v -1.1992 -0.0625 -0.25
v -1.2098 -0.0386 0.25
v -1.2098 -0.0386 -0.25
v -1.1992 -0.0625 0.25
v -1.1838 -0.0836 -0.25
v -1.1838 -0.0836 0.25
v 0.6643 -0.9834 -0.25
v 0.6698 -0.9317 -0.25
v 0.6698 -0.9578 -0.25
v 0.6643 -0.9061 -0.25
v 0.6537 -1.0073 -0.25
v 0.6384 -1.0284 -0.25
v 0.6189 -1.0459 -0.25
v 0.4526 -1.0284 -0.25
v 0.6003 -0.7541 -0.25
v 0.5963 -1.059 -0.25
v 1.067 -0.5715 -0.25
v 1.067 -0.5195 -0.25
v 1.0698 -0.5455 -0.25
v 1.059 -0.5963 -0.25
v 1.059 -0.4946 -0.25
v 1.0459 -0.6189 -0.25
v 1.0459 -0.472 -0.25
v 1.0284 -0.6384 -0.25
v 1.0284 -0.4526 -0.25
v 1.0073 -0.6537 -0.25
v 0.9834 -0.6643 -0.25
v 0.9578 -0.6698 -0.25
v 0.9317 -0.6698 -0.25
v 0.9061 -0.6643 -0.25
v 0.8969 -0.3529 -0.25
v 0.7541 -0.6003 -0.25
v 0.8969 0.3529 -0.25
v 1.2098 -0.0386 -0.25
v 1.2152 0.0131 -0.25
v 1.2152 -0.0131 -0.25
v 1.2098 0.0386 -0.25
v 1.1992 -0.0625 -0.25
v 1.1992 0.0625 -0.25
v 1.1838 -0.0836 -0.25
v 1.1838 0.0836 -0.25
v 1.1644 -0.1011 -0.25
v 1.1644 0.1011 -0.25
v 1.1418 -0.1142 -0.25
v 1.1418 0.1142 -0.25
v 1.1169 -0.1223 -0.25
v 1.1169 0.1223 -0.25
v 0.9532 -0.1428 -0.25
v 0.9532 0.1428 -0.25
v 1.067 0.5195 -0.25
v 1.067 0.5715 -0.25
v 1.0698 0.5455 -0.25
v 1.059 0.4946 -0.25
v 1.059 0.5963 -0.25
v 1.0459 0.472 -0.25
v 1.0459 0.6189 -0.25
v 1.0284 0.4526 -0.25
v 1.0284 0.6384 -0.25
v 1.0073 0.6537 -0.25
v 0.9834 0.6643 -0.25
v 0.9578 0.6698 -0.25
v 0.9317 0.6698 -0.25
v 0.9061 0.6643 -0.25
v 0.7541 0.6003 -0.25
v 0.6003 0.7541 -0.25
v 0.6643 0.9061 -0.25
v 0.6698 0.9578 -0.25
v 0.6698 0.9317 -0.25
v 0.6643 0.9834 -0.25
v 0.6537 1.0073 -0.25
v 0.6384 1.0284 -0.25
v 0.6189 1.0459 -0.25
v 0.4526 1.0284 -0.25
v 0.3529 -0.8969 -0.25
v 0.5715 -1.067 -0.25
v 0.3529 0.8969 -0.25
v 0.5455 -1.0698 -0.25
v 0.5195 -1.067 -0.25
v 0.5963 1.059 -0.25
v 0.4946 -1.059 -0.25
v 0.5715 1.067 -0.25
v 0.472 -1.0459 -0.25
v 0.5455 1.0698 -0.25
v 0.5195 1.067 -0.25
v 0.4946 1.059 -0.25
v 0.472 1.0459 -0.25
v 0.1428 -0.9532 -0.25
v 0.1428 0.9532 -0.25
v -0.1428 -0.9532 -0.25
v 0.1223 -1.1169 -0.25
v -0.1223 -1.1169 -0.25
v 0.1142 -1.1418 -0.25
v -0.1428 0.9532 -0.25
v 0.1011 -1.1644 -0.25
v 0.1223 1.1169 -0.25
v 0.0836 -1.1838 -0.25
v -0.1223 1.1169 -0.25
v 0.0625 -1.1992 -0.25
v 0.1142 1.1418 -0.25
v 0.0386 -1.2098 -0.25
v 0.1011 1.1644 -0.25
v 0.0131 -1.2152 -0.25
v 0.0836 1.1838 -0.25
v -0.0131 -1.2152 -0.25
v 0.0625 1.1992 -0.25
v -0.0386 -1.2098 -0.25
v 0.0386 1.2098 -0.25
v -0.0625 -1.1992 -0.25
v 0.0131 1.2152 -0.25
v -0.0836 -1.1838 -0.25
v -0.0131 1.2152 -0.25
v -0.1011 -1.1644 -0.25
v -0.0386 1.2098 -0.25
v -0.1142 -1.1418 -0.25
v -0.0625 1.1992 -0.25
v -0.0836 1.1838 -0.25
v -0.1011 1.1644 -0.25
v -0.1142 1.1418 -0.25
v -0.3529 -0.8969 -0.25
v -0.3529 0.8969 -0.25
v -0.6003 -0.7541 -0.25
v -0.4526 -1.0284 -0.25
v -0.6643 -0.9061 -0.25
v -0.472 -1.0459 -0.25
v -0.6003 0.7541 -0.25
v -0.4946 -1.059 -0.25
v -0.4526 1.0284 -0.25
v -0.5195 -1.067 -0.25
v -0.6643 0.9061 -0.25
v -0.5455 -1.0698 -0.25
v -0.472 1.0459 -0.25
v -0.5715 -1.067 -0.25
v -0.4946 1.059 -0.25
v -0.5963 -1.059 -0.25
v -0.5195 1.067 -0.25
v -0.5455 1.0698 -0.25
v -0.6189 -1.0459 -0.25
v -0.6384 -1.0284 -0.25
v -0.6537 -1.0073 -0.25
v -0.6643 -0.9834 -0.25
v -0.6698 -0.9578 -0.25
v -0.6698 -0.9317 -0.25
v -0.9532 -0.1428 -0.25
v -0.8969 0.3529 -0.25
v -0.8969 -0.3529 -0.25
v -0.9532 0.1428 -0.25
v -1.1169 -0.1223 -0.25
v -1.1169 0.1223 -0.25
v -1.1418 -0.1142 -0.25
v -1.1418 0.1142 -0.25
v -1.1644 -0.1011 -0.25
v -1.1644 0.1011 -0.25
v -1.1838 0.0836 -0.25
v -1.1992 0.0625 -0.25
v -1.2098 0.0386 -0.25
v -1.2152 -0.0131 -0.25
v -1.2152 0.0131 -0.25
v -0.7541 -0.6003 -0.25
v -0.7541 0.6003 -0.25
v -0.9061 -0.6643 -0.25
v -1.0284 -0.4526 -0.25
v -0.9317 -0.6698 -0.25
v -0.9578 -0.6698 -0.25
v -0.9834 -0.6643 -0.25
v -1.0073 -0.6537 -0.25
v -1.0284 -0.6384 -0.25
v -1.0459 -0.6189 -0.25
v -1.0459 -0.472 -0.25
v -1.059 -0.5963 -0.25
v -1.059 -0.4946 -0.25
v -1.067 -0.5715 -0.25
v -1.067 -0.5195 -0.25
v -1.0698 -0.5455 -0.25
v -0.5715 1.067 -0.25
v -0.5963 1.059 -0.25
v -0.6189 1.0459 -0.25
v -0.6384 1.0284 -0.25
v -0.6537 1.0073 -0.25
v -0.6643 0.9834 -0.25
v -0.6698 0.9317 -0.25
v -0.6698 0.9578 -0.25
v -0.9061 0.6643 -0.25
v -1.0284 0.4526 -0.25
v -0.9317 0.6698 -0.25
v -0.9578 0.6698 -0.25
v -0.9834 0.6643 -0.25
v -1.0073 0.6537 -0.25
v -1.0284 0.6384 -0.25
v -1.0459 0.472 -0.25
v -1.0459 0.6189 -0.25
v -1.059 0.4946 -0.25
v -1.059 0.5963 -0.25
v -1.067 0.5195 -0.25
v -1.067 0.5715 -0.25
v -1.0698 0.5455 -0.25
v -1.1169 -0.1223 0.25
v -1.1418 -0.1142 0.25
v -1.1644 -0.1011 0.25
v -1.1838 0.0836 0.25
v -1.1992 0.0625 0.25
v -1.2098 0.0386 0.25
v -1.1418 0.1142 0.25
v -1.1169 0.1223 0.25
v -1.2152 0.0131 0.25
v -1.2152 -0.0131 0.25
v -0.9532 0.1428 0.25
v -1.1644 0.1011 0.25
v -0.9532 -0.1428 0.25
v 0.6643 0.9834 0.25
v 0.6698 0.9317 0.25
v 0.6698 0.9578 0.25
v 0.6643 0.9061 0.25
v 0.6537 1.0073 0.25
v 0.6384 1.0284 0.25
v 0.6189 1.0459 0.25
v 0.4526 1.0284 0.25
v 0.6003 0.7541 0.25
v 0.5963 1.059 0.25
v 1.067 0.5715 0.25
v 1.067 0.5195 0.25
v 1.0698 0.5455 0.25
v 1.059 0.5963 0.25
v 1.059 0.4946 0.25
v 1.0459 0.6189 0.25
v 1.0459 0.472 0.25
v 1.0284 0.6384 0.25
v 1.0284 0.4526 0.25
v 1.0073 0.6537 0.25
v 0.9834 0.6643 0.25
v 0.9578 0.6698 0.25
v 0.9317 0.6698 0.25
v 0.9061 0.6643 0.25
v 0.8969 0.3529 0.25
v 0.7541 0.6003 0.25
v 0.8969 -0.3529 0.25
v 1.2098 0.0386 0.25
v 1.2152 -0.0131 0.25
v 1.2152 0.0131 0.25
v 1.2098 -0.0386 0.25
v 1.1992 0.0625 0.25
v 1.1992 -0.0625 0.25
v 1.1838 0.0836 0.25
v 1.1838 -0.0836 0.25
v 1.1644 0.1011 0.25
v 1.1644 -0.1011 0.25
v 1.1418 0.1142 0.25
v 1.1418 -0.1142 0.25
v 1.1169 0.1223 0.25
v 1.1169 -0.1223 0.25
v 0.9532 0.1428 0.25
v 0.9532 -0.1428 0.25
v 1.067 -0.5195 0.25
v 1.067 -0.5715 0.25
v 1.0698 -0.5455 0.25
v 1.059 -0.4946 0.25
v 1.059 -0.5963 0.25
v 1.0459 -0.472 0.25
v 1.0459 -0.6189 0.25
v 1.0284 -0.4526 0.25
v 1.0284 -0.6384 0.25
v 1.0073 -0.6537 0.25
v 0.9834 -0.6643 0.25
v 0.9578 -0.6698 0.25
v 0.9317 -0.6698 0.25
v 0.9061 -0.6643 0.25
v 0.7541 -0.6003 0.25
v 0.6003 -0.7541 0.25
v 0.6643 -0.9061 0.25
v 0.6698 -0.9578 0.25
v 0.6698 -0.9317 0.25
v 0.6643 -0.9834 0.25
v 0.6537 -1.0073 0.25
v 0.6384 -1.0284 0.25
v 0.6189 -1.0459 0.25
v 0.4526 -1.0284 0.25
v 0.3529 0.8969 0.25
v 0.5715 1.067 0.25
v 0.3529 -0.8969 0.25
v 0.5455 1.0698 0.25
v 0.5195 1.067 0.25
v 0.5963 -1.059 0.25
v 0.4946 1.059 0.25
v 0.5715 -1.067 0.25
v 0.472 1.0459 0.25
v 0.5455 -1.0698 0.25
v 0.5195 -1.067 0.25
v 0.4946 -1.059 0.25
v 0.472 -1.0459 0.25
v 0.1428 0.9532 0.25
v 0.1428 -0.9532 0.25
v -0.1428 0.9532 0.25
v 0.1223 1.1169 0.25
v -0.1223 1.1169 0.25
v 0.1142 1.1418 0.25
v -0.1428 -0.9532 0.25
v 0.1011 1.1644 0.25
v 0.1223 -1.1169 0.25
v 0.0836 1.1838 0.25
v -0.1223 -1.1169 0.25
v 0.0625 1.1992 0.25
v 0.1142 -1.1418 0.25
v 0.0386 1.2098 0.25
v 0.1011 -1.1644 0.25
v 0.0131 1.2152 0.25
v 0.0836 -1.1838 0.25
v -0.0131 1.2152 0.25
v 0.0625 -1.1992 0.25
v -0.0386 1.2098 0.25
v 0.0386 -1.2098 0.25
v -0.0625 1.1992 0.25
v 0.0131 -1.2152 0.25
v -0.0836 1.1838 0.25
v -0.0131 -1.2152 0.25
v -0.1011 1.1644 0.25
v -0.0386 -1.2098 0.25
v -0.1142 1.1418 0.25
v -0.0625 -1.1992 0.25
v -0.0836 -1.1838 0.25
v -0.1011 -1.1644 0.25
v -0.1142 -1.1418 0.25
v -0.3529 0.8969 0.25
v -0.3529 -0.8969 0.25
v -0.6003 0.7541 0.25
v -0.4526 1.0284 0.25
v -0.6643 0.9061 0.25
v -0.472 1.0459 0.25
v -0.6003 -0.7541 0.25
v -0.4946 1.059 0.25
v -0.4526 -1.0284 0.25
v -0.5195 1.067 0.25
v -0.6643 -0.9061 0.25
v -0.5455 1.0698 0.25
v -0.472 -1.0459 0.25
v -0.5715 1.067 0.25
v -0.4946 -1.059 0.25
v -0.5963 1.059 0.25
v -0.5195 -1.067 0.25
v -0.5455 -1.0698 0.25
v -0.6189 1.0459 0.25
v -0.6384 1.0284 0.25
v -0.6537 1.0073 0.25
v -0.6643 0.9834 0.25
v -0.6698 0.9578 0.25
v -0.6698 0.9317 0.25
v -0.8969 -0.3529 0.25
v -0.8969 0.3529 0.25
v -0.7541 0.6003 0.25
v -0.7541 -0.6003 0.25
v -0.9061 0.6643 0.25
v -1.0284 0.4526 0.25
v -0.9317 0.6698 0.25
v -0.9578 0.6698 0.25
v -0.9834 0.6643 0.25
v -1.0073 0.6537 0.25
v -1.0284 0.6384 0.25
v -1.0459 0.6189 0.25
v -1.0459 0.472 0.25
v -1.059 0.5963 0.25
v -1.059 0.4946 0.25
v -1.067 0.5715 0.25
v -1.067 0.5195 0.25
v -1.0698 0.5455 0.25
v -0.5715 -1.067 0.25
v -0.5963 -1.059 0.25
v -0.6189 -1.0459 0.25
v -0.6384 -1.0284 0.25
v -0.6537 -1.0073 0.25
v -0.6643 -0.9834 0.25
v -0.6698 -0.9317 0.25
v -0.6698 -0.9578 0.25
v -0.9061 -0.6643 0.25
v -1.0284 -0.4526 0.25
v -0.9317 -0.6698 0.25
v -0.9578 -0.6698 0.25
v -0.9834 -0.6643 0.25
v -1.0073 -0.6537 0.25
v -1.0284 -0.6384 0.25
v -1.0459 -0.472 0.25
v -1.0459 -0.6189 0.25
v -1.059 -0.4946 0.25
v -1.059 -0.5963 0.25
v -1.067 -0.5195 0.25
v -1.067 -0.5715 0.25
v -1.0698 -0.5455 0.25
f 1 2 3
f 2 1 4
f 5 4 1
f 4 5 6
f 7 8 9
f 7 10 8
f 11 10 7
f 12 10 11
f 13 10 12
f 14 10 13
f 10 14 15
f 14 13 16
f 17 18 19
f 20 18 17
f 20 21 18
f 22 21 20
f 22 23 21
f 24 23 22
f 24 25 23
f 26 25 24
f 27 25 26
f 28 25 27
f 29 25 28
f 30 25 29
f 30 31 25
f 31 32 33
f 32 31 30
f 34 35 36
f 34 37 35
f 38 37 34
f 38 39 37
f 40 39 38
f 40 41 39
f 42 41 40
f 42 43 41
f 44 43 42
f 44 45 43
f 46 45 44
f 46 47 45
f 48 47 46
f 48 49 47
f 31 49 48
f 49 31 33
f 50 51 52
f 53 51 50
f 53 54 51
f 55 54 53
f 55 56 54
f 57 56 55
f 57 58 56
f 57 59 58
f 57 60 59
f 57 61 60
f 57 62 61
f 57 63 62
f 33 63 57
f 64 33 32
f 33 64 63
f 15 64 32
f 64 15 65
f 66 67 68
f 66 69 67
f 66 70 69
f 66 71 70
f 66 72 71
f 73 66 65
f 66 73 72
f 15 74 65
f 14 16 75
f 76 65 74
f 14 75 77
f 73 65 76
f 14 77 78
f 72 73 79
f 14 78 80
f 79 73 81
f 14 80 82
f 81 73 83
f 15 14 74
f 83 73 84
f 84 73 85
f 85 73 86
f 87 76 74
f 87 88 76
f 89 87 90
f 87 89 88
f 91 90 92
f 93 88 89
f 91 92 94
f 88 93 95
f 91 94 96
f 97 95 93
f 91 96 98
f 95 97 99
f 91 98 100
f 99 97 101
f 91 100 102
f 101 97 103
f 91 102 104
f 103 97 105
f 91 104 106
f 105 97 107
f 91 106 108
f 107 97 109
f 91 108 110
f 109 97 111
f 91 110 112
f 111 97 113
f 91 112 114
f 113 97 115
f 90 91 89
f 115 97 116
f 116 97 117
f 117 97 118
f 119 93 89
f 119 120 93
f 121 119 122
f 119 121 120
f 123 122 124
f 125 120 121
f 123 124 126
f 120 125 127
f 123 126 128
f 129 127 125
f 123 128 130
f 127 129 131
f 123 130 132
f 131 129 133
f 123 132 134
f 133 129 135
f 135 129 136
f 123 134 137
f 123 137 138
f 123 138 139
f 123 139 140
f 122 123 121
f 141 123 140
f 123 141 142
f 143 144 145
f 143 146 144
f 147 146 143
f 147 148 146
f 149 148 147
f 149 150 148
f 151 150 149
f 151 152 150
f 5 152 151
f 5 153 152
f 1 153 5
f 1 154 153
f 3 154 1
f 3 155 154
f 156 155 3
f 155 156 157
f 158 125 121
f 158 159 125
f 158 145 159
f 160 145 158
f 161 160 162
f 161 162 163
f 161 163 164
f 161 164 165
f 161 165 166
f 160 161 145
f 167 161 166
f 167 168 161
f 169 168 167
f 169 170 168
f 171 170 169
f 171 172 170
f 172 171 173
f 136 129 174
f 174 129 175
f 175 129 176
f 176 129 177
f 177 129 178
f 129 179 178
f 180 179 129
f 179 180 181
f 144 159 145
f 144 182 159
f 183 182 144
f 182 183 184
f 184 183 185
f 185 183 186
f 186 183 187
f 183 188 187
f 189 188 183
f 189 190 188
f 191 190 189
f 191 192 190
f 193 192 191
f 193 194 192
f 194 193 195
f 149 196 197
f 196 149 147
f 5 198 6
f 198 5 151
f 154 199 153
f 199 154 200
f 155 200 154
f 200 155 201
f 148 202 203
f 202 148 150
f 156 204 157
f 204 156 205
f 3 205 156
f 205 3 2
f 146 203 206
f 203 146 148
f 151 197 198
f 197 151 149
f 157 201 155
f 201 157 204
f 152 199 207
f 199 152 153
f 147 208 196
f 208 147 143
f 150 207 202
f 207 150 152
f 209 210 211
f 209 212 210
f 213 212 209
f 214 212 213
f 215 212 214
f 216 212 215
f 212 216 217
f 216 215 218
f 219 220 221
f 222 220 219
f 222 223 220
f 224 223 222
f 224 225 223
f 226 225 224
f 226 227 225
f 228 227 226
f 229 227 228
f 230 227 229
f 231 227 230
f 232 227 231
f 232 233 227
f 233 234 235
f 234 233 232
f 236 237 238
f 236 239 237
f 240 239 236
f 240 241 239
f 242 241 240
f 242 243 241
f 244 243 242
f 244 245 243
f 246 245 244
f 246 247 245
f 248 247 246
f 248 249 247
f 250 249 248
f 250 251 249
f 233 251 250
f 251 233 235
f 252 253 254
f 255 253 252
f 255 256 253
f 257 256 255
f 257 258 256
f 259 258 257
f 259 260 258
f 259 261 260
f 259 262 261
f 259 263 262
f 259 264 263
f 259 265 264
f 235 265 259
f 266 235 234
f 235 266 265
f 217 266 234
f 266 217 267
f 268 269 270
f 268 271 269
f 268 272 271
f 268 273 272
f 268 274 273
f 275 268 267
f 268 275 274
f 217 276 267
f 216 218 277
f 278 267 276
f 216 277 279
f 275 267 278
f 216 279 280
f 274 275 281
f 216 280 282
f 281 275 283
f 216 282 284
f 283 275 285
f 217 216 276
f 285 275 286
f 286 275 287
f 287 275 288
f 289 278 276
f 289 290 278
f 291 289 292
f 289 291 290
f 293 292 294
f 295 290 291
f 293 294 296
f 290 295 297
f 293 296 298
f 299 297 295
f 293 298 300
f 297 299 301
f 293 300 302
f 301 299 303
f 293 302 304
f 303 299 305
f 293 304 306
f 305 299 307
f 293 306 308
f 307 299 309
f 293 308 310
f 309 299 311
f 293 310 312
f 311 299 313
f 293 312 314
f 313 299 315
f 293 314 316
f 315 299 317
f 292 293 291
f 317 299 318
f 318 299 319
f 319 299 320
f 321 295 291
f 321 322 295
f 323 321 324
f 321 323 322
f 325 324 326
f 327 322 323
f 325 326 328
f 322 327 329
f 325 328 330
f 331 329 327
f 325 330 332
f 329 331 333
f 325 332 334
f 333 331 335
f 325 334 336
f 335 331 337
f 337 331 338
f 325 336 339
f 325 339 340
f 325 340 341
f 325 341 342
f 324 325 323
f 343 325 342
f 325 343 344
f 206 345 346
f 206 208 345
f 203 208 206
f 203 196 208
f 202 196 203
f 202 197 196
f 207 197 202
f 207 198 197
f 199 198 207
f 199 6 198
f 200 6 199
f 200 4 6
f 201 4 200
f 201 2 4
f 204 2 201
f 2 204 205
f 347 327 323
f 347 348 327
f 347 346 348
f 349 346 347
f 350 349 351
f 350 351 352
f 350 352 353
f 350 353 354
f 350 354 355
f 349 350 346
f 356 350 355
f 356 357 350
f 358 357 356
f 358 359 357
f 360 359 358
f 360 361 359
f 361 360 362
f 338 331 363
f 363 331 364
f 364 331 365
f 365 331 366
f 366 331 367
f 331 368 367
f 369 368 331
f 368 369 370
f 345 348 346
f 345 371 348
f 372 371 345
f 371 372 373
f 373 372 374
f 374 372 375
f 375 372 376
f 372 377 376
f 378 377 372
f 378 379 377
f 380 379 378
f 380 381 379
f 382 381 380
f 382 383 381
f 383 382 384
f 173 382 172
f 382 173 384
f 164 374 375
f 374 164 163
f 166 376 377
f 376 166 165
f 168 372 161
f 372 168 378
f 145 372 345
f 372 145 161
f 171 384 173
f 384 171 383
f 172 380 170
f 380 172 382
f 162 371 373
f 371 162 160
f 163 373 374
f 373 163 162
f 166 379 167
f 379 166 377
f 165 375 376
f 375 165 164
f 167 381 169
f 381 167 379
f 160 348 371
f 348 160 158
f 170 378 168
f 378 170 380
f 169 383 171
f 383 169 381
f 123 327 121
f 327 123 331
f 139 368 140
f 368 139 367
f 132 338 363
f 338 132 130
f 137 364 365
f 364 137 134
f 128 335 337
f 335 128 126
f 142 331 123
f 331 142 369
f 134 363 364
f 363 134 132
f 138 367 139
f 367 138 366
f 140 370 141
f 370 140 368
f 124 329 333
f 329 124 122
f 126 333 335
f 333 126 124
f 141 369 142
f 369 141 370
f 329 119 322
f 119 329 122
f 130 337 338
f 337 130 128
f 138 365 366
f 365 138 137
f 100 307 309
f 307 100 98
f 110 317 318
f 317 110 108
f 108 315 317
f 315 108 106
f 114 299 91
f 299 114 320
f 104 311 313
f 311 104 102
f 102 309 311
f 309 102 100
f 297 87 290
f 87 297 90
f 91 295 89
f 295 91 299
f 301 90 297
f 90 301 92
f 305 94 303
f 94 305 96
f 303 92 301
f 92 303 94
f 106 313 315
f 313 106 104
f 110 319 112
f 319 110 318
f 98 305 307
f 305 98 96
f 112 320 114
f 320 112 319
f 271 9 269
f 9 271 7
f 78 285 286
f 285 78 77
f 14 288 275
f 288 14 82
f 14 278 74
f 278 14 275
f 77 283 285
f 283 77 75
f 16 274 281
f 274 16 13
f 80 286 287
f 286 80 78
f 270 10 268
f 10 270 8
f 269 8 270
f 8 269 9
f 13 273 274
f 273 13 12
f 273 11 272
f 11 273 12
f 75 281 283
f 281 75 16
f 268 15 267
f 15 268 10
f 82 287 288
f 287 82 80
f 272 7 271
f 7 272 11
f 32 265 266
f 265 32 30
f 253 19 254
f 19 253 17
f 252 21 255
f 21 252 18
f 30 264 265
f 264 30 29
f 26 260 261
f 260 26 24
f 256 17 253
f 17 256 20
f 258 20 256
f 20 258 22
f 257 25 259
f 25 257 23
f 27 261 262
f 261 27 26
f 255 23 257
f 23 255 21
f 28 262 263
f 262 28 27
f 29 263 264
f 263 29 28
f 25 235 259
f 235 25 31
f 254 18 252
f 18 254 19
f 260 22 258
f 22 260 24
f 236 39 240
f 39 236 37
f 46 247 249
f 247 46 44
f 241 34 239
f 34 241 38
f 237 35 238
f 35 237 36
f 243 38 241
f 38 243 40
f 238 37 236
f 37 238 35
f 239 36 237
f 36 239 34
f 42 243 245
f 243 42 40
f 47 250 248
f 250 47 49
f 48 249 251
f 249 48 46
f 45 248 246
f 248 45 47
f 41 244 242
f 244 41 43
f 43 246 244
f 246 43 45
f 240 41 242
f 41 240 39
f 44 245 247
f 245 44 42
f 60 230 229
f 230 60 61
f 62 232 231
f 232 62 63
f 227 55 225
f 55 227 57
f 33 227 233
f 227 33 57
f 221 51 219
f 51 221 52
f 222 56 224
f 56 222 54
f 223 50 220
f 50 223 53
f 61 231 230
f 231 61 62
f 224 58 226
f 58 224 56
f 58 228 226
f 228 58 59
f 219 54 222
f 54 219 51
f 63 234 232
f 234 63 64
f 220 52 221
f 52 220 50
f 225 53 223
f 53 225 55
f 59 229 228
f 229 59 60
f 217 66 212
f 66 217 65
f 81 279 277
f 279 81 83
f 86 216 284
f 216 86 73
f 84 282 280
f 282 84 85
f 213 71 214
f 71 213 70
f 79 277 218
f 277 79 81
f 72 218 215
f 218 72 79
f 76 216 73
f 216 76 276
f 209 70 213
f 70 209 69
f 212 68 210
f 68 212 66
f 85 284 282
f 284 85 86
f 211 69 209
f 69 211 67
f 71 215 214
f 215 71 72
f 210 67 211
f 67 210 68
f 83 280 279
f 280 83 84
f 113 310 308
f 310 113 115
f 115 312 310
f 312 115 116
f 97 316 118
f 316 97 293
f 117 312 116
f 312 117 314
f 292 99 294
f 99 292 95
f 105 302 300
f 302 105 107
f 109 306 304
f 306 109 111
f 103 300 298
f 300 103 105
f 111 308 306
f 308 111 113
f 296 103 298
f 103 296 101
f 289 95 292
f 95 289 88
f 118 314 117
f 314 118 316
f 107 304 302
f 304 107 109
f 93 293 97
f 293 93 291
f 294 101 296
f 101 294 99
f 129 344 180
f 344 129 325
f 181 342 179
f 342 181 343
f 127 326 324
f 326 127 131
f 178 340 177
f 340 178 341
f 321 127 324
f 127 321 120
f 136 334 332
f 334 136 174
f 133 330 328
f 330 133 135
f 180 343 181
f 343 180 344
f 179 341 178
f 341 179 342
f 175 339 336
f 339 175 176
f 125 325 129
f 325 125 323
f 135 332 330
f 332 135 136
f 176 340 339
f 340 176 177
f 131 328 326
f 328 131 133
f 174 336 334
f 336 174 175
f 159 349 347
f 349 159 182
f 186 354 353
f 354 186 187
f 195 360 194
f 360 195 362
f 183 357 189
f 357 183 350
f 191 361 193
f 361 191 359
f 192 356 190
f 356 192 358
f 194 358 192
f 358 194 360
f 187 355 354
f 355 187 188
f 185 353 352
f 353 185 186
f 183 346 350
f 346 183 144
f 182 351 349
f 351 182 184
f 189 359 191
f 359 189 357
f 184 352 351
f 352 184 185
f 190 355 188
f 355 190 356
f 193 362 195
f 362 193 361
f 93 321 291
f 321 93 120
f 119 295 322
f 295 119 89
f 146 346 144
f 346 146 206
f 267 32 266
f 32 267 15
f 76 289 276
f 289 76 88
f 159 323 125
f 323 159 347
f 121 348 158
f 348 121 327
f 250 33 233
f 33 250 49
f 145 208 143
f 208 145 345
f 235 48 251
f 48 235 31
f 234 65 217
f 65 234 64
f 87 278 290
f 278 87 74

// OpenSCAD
TOOTH_MODE_HULL = 0;
TOOTH_MODE_MINKOWSKI = 1;
TOOTH_MODE_SQUARE = 2;

tMode = 0; // TOOTH_MODE_HULL;
scale_ = 1;
toothWidth = .25;
toothCount = 12;
height = .5;
toothDepth = .25;
_wantHoles = false;
//peg();
//Example
//sawTooth(toothCount, toothWidth, height, toothDepth, toothDepth * 2.7, tMode, scale_);
gearT(toothCount, toothWidth, height, toothDepth, tMode, scale_, _wantHoles);

//Generates a gear mesh
//Radius scales with tooth width (twidth) and toothCount
module gearT(toothCount, 
    twidth, 
    height, 
    tdepth, 
    toothMode = TOOTH_MODE_HULL, 
    _scale = 1, 
    wantHoles = true) 
{
t = toothCount;
twidth = twidth * _scale;
innerR = twidth/sin(180/t);
hi = height * _scale;
ir = innerR;
tdepth = tdepth * _scale;
or = innerR + tdepth;
wedge = 360 / (t);

rotate([0,0,90]) {
difference() {
union(){
    rotate([0,0,.25 * wedge])translate([0,0,0])
        cylinder($fn = t * 2, hi, ir, ir, true);
    for(i = [0 : floor(t)]) {
        rotate([0, 0, (i + 0) * wedge]) {
            $fn = 30;
            if (toothMode == 0) {
                translate([0,0,-hi/2])
                hullTooth(or, innerR, toothDepth, twidth, hi);            
            } else if (toothMode == 1) {
                translate([-twidth/4,0,0])
                minkowski() {
                    cube([twidth/2, or , hi/2], true);
                    translate([twidth/4.0, or/2,-hi/4.0]) 
                        cylinder(h = hi/2, r=twidth/4.0);
                }
            } else {
                cube([twidth, or * 2 , hi], true);
            }
        }
    }
}
if (wantHoles) { 
//holes
color([0,.7,1,1]) {
   translate([0,0,-hi]) {
       centerSocketR = twidth * .85;
       holeR = twidth *.65;
       if (t < 8) {
           centerSocketR = twidth * .65;
           holeR = twidth *.45;
           cylinder($fn = 6, h = hi * 5, r = centerSocketR, true);
           socketHoles(radius=holeR, distanceFromCenter=innerR * .65);
       } else {
           cylinder($fn = 6, h = hi * 5, r = centerSocketR, true);
           socketHoles(radius=holeR, distanceFromCenter=innerR * .65);
       }
   }
}
}
}
}
}

module sawTooth(toothCount, twidth, height, tdepth, toothBaseOffset, toothMode = TOOTH_MODE_HULL, _scale = 1) 
{
t = toothCount;
twidth = twidth * _scale;
////innerR = toothBaseOffset; // twidth/sin(180/t);
hi = height * _scale;
ir = toothBaseOffset;
tdepth = tdepth * _scale;
or = toothBaseOffset + tdepth;
wedge = 360 / (t);

start = twidth * 2 * t;
boxStart = start + twidth * 1.2;
rotate([90,0,0]) {
difference() {
union(){
    
    translate([-boxStart/2, 0, -hi/2])
    cube([boxStart, toothBaseOffset, hi], false);
    translate([-start * .5, 0, 0])
    for(i = [0 : t]) {
        translate([i * twidth * 2, toothDepth /2, 0]) {
            $fn = 30;
            if (toothMode == 0) {
                translate([0,0,-hi/2])
                hullTooth(or, toothBaseOffset, toothDepth, twidth, hi);            
            } 
            else if (toothMode == 1) {
                translate([-twidth/4,0,0])
                minkowski() {
                    cube([twidth/2, or , hi/2], true);
                    translate([twidth/4.0, or/2,-hi/4.0]) 
                        cylinder(h = hi/2, r=twidth/4.0);
                }
            } else {
                cube([twidth, or * 2 , hi], true);
            }
        }
    }
}
//holes
color([0,.7,1,1]) {
   translate([0,toothBaseOffset/2,-hi]) {
       centerSocketR = twidth * .85;
       holeR = twidth *.65;
       translate([-start/2 + twidth, 0, 0]) {
        cylinder($fn = 6, h = hi * 5, r = centerSocketR, true);
        translate([twidth * 3,0,0])
           socketHole(holeR);
       }
       translate([start/2 - twidth, 0, 0]) {
        cylinder($fn = 6, h = hi * 5, r = centerSocketR, true);  
           translate([-twidth * 3,0,0])
           socketHole(holeR);
       }
   }
}
}
}
}

module hullTooth(or, ir, tdepth, twidth, hi) {
    hull() {
               outerCenter = or - tdepth/2;
               toothBaseWidth = twidth * 1;
               innerCenter = ir - toothBaseWidth / 2;
               translate([0,outerCenter,0]) 
                    cylinder(h = hi, r = twidth/2);
               translate([0,innerCenter,0]) 
                    cylinder(h = hi, r = twidth/(1.6));
             }
}

module peg() {
    color([0,.7,1,1]) {
       centerSocketR = toothWidth * .85;
       if (toothCount < 8) {
           centerSocketR = toothWidth * .65;
           cylinder($fn = 6, h = height * 5, r = centerSocketR, true);
       } else {
           cylinder($fn = 6, h = height * 5, r = centerSocketR, true);
       }
   }
}

module socketHoles(radius, distanceFromCenter) {
   sockets = 4;
   for(i = [0 : sockets]) {
       rad = distanceFromCenter;
       ang = (i/sockets) * 360;
       translate([rad * sin(ang), rad * cos (ang), 0]) {
           socketHole(radius);
//            cylinder($fn = 14, h = hi * 5, r = radius, true);       
        }
    }
}

module socketHole(radius) {
    cylinder($fn = 14, h = hi * 5, r = radius, true); 
}

//tooth width scales with tooth count and inner radius
module gear(teeth, height, innerR, outerR) {
t = teeth;
hi = height;
ir = innerR;
or = outerR;

wedge = 360 / (t);
twidth = ir * sin (wedge / 2.0);
echo(twidth);

$fn = 30;
union(){
    cylinder($fn = t * 2, hi, ir, ir, true);
    for(i = [0 : t]) {
        rotate([0, 0, (i + .25) * wedge]) {
            translate([-twidth/4,0,0])
            minkowski() {
                cube([twidth/2 * 1.05, or , hi/2], true);
                translate([twidth/4.0, or/2,-hi/4.0]) 
                    cylinder(h = hi/2, r=twidth/4.0);
            }
        }
    }
}
}
